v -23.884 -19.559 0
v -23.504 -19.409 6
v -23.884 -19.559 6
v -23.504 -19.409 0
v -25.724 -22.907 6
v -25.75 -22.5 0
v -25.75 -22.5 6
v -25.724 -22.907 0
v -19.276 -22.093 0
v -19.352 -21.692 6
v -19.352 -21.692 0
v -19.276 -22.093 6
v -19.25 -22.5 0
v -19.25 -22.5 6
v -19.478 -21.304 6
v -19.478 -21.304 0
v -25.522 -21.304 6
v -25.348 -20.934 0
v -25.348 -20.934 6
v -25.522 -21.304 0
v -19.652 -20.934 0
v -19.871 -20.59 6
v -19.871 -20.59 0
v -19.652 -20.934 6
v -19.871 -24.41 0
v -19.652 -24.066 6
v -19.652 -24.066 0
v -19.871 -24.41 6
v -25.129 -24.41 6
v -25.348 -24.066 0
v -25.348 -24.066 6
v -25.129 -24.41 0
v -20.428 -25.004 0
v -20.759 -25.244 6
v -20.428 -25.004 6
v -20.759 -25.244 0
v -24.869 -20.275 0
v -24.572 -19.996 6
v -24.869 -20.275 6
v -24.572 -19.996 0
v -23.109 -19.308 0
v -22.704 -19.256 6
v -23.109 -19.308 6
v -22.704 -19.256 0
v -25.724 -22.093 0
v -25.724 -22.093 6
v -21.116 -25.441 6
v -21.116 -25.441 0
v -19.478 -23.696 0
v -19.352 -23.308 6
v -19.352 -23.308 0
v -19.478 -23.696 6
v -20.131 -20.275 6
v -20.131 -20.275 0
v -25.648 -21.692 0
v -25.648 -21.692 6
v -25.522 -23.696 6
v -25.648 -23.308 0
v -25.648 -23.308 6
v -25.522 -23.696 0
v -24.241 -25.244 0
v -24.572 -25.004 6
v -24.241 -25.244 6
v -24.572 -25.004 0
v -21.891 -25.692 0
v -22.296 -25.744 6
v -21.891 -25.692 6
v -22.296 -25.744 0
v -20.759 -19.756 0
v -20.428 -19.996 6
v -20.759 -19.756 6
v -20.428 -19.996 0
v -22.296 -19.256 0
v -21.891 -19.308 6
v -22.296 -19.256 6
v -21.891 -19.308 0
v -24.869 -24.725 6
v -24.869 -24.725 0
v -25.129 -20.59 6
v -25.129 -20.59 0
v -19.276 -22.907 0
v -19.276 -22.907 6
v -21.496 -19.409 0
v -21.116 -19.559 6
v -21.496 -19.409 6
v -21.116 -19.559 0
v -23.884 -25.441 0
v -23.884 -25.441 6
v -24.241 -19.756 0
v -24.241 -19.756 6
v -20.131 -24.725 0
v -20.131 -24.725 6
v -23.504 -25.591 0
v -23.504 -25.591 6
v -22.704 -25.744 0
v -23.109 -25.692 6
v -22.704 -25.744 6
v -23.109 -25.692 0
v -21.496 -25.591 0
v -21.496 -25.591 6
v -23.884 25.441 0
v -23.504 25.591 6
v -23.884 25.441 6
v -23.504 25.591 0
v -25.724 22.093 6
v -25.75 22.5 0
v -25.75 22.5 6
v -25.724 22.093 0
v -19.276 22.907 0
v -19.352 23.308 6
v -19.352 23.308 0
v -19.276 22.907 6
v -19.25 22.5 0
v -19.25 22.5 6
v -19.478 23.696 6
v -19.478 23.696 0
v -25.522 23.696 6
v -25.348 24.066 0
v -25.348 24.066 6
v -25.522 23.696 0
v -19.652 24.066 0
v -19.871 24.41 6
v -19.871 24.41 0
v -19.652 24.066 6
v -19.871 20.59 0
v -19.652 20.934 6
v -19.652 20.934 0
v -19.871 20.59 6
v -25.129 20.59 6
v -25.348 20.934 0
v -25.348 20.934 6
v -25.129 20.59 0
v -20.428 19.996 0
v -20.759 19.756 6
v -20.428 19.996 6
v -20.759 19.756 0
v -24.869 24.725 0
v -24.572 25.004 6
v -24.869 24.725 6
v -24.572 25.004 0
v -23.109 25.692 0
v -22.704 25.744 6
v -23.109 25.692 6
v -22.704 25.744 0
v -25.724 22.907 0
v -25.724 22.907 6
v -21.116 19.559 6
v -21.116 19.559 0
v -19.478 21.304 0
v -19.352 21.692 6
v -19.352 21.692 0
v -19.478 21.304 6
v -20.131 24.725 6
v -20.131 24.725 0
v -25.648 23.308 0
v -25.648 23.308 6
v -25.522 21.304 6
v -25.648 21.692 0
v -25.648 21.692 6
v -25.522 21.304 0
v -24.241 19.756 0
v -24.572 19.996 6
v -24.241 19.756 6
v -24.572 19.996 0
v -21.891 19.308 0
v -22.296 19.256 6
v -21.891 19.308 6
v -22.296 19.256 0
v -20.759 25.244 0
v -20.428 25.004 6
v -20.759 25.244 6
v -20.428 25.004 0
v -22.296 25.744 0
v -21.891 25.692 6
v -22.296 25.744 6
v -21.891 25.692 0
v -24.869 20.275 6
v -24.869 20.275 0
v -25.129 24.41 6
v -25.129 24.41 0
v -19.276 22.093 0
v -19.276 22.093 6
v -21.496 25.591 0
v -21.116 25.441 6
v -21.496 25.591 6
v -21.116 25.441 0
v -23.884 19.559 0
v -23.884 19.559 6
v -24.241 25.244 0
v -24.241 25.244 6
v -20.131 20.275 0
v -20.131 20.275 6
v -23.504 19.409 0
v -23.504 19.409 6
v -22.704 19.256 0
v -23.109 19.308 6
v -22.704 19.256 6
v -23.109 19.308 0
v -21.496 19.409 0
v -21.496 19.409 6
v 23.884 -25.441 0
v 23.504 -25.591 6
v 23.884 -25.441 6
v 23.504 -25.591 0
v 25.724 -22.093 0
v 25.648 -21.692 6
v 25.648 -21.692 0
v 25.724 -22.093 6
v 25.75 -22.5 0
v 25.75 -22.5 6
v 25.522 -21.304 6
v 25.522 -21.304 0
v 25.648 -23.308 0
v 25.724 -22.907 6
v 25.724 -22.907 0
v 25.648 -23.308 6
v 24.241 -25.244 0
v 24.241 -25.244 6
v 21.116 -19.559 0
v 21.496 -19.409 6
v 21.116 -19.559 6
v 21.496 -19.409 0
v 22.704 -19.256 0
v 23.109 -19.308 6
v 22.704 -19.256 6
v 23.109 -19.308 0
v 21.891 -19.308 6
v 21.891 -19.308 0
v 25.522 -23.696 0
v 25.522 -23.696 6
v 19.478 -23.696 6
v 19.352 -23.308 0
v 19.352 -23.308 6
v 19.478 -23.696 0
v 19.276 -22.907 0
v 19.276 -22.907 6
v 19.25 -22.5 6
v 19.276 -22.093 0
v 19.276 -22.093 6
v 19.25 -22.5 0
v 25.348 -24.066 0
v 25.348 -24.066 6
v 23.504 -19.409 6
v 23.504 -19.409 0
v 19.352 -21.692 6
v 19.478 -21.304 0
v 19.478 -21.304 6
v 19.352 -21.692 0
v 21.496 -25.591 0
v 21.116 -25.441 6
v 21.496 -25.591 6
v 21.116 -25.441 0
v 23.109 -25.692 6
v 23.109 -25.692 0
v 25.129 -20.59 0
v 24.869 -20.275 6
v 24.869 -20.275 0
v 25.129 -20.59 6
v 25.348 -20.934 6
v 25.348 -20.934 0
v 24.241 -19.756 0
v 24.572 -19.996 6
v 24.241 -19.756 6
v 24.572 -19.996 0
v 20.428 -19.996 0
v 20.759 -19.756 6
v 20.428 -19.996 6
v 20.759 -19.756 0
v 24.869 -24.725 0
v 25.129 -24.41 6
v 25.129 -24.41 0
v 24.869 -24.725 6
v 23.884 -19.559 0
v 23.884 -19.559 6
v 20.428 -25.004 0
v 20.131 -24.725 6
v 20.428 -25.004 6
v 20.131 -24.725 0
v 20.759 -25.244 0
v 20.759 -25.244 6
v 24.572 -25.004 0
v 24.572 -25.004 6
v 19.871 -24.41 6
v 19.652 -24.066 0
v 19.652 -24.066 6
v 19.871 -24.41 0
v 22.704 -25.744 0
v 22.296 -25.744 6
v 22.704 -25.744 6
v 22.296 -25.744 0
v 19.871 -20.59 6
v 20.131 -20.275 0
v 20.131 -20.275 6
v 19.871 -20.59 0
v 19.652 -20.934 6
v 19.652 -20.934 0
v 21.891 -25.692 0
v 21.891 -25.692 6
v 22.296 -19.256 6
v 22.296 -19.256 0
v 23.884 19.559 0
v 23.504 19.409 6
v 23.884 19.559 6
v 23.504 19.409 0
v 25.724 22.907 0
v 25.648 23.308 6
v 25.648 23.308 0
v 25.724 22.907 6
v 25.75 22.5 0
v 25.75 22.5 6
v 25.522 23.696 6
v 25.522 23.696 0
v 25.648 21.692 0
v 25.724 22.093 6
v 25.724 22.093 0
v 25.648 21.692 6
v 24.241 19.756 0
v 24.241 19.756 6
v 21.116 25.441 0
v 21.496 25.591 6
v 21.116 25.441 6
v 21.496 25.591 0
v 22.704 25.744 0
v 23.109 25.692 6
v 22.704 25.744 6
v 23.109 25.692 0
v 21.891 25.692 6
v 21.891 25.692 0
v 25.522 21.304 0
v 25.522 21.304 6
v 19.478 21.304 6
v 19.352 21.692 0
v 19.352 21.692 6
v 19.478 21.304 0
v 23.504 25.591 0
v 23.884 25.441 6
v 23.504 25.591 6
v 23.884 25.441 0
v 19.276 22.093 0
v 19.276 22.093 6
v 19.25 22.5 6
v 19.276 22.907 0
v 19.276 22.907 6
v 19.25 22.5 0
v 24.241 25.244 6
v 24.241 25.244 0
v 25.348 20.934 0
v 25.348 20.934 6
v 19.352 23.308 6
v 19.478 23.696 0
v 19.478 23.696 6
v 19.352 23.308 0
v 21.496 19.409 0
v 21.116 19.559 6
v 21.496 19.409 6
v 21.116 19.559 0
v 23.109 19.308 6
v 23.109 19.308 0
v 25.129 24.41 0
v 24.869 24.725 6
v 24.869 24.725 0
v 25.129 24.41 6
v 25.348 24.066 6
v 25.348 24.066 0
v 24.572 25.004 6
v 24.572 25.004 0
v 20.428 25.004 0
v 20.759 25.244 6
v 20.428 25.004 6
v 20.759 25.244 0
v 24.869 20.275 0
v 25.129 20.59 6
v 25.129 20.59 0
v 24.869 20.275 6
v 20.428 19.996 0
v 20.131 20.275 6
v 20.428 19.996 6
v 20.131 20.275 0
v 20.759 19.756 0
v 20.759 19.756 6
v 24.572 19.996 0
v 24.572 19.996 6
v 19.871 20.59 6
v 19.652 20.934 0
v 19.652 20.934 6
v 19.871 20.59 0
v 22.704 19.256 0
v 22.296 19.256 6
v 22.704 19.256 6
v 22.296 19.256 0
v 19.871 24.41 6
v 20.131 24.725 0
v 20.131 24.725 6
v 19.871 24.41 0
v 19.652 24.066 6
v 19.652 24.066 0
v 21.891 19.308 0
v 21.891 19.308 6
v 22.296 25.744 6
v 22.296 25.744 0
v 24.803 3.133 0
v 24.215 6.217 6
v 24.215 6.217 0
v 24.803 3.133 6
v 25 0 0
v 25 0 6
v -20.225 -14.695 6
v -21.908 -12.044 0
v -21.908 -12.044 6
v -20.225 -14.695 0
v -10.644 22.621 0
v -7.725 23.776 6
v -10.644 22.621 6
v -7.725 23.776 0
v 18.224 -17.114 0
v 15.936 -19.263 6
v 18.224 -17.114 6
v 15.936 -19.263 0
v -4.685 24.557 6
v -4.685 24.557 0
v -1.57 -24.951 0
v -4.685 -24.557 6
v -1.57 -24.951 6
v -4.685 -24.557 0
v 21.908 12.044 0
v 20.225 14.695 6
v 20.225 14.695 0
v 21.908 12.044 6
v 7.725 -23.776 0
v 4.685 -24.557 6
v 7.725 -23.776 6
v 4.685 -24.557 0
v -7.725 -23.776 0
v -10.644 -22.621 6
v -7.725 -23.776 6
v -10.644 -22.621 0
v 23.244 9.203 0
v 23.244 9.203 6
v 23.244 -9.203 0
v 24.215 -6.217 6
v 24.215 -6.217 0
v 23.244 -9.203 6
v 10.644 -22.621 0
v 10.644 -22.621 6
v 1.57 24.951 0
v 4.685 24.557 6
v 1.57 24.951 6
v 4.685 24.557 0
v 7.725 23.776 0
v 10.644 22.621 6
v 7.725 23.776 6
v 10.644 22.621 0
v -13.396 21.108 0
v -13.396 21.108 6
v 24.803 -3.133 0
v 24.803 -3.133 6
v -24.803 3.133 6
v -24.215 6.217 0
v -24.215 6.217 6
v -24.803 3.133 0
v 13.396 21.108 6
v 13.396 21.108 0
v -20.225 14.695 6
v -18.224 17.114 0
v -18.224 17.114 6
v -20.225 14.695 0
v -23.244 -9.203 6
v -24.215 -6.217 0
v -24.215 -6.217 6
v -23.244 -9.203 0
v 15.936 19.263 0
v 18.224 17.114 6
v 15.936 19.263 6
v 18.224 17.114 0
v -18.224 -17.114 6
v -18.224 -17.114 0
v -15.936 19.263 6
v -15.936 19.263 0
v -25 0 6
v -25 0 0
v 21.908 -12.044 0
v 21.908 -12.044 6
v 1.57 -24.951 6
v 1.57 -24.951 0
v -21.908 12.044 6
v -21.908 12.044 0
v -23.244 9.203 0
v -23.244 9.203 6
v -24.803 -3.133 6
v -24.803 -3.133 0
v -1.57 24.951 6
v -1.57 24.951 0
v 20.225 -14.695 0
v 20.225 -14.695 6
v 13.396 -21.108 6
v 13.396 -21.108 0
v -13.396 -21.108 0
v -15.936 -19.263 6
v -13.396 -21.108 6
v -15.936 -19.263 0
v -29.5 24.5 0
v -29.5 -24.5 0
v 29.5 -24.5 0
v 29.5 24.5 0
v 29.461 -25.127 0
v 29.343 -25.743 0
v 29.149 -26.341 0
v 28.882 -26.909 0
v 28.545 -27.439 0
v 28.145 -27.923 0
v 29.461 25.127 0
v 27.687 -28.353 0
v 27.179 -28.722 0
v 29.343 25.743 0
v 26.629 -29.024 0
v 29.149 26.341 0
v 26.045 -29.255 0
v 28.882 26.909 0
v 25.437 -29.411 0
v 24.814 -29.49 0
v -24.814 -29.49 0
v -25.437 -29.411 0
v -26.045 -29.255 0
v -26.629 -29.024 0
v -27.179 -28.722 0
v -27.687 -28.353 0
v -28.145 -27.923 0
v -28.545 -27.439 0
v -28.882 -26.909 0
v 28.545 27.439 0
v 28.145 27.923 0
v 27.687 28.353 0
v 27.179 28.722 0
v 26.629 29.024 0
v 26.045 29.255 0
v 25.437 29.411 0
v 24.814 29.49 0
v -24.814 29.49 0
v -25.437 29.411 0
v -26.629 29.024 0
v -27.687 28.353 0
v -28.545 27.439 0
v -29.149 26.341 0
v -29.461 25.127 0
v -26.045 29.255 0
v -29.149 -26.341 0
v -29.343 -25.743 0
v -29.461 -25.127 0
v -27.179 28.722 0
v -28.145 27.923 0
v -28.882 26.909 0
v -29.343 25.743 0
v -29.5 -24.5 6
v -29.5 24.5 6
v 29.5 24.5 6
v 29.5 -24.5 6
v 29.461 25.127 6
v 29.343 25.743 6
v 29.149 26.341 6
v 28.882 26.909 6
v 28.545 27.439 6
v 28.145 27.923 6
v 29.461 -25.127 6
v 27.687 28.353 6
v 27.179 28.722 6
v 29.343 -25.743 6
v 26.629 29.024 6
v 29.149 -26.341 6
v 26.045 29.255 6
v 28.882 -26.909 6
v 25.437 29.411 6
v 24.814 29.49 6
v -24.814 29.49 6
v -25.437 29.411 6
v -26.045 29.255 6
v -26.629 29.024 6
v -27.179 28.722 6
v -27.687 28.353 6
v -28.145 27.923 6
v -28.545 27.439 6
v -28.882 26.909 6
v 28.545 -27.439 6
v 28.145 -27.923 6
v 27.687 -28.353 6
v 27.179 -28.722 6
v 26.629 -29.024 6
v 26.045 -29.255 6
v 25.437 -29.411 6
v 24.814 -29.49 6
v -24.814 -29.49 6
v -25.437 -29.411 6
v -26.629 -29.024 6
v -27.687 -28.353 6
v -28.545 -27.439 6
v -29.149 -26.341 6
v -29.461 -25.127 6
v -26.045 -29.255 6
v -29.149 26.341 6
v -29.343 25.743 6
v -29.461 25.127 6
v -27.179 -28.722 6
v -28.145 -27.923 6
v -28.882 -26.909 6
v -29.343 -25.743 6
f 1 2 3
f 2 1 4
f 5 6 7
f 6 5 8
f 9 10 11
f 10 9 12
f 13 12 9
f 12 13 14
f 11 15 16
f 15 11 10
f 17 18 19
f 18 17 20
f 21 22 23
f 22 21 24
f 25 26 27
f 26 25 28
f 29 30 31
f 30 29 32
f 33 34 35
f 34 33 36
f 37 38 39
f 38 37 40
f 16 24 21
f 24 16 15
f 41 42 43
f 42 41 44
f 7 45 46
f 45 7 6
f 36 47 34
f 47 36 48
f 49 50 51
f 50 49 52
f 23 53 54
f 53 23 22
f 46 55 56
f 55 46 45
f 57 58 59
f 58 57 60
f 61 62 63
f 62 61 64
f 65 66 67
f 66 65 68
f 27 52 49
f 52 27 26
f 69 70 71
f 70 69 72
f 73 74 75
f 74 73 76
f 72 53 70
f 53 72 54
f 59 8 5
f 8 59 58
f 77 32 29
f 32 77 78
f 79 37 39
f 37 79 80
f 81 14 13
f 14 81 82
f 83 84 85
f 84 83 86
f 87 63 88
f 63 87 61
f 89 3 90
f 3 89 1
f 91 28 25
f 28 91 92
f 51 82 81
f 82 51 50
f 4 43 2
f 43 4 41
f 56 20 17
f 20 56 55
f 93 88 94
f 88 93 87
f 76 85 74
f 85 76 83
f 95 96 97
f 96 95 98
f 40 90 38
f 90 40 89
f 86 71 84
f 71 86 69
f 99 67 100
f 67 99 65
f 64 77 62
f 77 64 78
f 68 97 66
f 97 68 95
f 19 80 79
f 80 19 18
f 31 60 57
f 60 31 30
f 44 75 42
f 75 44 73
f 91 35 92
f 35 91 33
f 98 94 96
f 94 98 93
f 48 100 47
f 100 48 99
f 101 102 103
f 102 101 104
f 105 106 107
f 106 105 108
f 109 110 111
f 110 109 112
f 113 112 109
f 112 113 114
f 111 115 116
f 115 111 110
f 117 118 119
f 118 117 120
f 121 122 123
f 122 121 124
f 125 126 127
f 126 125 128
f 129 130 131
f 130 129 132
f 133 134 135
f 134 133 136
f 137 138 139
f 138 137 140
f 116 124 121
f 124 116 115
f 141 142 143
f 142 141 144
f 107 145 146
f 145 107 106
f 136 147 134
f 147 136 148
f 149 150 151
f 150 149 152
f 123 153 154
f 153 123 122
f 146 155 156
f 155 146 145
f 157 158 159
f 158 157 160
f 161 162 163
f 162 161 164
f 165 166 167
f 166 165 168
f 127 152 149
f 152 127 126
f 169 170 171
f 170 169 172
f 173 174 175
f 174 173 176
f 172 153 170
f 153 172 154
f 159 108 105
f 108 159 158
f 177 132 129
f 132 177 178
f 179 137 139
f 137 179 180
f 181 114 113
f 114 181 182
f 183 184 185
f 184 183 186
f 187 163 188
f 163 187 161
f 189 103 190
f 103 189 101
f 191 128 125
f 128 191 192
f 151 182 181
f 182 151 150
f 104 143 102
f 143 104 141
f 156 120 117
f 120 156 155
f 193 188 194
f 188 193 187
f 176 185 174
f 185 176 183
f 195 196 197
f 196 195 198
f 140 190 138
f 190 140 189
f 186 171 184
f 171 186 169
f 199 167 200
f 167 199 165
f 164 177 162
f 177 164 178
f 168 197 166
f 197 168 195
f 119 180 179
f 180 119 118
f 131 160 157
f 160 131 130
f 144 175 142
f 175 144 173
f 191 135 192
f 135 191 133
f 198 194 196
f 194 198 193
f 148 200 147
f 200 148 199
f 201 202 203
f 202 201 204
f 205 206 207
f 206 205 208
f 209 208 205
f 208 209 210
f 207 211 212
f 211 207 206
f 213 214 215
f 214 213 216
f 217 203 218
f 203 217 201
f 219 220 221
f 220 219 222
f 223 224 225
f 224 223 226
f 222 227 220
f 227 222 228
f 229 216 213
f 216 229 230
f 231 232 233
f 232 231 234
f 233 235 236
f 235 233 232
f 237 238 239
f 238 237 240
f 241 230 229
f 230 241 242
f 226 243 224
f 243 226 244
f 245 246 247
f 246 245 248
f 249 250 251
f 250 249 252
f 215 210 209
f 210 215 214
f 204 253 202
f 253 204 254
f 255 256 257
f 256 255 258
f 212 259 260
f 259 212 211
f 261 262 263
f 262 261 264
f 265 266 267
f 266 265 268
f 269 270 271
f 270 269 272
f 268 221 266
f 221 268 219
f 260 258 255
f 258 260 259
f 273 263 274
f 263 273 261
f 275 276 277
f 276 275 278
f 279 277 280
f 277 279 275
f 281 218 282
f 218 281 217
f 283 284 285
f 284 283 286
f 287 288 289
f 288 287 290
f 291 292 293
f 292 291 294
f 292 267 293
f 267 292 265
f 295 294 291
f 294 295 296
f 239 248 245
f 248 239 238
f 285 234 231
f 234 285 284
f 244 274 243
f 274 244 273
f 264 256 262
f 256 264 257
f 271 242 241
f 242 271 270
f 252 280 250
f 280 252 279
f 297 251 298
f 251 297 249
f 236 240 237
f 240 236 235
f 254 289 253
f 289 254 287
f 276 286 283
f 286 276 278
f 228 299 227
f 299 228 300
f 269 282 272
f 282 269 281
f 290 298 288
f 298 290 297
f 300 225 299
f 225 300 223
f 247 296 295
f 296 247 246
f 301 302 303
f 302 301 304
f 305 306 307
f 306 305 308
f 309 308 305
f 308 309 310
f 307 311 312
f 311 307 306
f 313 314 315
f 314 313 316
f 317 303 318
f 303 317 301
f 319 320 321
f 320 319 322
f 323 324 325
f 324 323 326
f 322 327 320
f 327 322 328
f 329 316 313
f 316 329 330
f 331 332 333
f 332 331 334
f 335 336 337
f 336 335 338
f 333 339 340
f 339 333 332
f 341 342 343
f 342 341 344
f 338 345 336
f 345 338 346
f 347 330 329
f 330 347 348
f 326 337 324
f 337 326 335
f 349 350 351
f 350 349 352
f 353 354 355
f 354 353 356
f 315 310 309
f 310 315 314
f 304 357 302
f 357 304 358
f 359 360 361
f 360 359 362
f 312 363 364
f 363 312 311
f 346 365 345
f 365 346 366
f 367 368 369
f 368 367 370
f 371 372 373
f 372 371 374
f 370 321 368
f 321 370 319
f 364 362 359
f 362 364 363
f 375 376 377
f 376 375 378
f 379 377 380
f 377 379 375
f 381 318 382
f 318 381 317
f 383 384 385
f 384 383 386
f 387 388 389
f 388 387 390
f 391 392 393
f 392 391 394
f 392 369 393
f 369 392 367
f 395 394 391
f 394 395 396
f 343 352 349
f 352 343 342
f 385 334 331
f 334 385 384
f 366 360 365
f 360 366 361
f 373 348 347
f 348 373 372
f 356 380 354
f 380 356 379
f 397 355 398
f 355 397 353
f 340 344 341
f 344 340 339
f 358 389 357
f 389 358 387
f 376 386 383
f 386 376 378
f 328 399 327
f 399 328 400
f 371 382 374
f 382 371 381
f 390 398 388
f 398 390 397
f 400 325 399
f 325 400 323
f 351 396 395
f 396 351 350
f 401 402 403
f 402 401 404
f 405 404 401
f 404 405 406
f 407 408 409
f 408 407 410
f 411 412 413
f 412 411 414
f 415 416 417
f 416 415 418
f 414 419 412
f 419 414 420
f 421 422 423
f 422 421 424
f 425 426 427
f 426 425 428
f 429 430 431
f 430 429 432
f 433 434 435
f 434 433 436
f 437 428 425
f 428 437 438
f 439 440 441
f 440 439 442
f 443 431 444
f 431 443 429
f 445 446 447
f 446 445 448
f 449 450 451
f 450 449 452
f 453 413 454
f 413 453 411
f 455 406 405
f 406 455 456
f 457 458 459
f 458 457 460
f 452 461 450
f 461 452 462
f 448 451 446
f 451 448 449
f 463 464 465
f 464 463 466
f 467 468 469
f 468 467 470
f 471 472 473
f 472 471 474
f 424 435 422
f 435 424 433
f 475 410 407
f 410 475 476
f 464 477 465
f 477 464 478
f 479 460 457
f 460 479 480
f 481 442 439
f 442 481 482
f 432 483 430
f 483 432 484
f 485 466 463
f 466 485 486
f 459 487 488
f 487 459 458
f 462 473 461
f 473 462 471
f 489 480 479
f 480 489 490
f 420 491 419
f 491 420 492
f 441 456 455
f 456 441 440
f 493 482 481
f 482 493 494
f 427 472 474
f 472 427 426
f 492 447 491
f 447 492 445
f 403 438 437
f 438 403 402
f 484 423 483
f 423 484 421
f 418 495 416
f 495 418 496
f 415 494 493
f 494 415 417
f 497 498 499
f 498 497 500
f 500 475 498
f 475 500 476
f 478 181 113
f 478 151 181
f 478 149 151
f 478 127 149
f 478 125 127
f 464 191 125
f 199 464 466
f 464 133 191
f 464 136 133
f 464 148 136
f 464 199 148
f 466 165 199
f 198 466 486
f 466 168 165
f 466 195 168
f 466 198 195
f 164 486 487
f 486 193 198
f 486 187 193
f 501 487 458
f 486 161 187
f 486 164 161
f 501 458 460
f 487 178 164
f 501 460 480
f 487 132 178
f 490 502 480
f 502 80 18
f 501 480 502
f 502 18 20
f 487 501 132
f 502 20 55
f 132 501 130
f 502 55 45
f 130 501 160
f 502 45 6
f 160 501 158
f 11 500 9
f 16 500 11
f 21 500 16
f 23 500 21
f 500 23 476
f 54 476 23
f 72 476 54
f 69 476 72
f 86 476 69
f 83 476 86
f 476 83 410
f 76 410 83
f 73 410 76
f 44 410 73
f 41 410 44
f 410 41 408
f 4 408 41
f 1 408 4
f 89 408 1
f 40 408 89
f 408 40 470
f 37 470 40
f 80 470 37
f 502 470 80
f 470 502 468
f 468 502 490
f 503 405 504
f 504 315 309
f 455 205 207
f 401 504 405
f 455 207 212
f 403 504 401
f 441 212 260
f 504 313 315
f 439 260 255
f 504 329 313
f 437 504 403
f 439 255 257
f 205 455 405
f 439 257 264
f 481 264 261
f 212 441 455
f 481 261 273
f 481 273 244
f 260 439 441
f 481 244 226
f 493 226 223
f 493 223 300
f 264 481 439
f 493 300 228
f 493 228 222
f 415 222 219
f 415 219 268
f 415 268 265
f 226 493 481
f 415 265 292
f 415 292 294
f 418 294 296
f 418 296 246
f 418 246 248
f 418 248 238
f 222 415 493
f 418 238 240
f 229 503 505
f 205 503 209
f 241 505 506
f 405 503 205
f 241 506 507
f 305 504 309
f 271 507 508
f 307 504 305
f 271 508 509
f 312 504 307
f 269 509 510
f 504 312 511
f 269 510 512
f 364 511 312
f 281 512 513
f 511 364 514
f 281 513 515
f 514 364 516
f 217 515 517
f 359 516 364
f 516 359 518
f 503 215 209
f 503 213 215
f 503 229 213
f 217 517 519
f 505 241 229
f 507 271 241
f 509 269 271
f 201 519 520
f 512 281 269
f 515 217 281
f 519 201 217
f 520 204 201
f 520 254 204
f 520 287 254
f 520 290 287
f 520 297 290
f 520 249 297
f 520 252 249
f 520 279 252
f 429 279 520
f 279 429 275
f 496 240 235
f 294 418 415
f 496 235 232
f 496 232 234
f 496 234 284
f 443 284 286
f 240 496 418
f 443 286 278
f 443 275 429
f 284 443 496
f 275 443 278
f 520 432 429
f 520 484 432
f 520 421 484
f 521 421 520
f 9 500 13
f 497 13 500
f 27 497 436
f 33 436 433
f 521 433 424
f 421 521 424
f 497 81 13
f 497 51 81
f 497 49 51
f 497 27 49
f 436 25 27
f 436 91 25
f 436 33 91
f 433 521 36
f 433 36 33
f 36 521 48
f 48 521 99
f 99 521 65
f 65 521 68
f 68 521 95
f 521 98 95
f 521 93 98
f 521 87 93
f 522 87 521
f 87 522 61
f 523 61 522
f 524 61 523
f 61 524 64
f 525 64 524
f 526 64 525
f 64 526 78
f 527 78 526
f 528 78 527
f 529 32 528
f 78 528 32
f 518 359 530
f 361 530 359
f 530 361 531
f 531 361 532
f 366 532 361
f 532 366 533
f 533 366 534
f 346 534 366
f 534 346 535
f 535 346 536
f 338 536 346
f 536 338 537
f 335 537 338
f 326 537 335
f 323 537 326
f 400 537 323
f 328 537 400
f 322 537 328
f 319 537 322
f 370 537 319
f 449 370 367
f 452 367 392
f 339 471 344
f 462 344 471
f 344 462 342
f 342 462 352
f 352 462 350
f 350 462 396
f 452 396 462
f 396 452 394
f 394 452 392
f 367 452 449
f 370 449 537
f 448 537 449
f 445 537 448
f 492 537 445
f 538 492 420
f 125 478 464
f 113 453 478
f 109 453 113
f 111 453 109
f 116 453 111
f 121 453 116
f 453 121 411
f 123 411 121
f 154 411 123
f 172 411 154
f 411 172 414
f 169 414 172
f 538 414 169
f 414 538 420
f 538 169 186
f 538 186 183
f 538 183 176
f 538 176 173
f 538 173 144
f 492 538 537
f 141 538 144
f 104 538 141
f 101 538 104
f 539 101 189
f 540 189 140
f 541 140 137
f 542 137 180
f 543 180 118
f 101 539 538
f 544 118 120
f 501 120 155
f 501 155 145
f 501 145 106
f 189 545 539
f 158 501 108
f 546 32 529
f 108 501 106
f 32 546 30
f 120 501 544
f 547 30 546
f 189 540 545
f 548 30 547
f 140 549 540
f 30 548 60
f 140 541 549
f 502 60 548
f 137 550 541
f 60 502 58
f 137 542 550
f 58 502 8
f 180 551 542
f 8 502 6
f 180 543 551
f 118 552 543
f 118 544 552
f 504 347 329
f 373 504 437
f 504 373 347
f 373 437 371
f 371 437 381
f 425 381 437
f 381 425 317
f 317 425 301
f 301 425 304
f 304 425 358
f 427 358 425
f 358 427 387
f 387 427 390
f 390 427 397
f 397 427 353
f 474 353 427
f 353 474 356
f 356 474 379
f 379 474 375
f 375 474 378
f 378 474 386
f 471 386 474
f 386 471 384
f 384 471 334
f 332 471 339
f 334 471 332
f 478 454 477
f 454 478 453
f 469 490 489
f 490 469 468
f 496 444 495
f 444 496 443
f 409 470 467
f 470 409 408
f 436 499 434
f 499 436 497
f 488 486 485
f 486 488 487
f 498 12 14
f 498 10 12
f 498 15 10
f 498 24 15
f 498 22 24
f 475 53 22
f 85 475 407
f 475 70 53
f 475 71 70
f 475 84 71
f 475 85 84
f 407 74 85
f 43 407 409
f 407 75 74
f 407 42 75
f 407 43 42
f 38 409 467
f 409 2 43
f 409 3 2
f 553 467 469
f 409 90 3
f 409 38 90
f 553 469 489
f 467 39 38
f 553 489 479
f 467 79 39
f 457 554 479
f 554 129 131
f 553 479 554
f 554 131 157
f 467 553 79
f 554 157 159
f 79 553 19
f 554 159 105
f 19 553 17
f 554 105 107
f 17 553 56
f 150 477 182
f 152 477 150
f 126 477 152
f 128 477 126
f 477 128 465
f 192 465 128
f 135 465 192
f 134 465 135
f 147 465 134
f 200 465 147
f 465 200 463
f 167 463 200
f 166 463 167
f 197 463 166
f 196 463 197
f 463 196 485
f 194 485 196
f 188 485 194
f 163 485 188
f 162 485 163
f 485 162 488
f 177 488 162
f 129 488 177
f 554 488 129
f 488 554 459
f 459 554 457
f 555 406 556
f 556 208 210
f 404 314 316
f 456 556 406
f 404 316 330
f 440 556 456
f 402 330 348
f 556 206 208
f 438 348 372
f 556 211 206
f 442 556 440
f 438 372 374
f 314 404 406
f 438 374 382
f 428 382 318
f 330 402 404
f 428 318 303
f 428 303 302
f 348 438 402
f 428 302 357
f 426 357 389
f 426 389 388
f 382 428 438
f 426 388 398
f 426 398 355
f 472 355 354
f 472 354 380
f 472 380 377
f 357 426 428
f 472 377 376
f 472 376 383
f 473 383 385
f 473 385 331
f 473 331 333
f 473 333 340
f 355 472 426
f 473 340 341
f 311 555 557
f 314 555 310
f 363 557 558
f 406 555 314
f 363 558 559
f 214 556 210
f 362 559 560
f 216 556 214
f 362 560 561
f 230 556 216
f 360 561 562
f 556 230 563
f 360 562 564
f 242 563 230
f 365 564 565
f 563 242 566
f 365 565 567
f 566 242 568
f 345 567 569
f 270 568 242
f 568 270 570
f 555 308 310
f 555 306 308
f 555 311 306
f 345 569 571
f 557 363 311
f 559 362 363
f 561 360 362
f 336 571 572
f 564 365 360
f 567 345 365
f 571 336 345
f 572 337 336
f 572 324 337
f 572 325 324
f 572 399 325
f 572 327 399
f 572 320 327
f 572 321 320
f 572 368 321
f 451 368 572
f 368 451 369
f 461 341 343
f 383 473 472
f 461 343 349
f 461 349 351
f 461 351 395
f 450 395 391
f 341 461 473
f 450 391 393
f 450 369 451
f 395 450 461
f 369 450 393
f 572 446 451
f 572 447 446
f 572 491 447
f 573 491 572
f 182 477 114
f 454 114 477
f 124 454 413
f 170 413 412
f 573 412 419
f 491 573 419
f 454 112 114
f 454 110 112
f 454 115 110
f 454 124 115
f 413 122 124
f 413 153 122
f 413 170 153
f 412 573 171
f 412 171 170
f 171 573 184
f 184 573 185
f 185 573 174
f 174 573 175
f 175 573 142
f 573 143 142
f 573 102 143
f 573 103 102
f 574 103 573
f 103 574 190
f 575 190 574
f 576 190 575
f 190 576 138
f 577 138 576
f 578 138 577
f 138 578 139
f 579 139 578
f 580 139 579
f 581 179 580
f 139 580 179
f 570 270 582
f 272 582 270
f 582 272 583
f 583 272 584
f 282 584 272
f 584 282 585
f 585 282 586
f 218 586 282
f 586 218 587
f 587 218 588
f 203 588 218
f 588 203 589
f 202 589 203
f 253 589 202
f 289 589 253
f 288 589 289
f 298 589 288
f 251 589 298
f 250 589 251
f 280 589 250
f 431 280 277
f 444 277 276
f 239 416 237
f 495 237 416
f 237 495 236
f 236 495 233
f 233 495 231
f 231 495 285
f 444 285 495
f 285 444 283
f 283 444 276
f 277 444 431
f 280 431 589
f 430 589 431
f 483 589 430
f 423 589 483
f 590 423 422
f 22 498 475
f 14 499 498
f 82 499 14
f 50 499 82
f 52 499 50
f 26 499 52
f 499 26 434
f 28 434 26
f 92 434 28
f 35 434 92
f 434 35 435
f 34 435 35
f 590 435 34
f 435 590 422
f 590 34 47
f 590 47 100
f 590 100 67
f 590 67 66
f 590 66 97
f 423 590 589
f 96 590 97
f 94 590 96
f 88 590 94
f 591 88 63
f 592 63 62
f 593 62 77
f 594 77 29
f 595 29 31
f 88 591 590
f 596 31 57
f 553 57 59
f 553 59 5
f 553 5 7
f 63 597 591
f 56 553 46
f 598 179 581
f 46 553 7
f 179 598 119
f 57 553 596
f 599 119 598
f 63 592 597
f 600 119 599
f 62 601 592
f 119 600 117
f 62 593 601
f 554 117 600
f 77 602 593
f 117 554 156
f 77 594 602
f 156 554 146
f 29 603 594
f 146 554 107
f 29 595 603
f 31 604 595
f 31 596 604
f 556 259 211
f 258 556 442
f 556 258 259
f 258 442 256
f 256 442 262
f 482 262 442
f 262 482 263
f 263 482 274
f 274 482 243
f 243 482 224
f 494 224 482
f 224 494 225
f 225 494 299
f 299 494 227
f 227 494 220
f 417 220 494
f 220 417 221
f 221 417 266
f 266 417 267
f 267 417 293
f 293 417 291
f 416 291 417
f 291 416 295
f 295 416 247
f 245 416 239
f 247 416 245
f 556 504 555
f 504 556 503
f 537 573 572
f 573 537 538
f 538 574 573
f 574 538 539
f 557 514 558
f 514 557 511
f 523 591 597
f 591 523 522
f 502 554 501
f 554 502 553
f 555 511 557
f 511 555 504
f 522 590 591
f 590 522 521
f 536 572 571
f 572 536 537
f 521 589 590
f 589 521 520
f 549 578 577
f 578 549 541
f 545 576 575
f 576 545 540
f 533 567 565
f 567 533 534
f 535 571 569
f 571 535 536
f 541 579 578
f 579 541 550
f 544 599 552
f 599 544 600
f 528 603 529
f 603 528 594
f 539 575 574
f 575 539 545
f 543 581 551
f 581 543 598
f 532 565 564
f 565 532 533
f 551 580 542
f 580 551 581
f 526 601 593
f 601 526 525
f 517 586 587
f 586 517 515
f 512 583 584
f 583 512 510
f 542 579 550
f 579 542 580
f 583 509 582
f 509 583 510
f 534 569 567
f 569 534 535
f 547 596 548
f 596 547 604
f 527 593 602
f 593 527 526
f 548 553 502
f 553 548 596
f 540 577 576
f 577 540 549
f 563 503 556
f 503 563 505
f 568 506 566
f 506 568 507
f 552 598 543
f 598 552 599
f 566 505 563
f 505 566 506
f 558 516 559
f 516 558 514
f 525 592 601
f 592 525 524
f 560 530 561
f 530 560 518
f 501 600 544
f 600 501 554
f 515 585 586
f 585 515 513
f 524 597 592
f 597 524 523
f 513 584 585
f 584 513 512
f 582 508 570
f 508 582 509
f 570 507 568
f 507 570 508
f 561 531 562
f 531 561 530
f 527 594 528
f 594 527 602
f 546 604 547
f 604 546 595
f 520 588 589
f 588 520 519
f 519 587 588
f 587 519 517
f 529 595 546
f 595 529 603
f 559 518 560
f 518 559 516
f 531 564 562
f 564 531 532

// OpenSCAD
$fn = 50;

difference() {
	union() {
		hull() {
			translate(v = [-24.5, 24.5, 0]) {
				cylinder(h = 6, r = 5);
			}
			translate(v = [24.5, 24.5, 0]) {
				cylinder(h = 6, r = 5);
			}
			translate(v = [-24.5, -24.5, 0]) {
				cylinder(h = 6, r = 5);
			}
			translate(v = [24.5, -24.5, 0]) {
				cylinder(h = 6, r = 5);
			}
		}
	}
	union() {
		translate(v = [-22.5, -22.5, -100.0]) {
			cylinder(h = 200, r = 3.25);
		}
		translate(v = [-22.5, 22.5, -100.0]) {
			cylinder(h = 200, r = 3.25);
		}
		translate(v = [22.5, -22.5, -100.0]) {
			cylinder(h = 200, r = 3.25);
		}
		translate(v = [22.5, 22.5, -100.0]) {
			cylinder(h = 200, r = 3.25);
		}
		translate(v = [-22.5, -22.5, -100.0]) {
			cylinder(h = 200, r = 1.8);
		}
		translate(v = [-22.5, 22.5, -100.0]) {
			cylinder(h = 200, r = 1.8);
		}
		translate(v = [22.5, -22.5, -100.0]) {
			cylinder(h = 200, r = 1.8);
		}
		translate(v = [22.5, 22.5, -100.0]) {
			cylinder(h = 200, r = 1.8);
		}
		cylinder(h = 6, r = 25.0);
	}
}
